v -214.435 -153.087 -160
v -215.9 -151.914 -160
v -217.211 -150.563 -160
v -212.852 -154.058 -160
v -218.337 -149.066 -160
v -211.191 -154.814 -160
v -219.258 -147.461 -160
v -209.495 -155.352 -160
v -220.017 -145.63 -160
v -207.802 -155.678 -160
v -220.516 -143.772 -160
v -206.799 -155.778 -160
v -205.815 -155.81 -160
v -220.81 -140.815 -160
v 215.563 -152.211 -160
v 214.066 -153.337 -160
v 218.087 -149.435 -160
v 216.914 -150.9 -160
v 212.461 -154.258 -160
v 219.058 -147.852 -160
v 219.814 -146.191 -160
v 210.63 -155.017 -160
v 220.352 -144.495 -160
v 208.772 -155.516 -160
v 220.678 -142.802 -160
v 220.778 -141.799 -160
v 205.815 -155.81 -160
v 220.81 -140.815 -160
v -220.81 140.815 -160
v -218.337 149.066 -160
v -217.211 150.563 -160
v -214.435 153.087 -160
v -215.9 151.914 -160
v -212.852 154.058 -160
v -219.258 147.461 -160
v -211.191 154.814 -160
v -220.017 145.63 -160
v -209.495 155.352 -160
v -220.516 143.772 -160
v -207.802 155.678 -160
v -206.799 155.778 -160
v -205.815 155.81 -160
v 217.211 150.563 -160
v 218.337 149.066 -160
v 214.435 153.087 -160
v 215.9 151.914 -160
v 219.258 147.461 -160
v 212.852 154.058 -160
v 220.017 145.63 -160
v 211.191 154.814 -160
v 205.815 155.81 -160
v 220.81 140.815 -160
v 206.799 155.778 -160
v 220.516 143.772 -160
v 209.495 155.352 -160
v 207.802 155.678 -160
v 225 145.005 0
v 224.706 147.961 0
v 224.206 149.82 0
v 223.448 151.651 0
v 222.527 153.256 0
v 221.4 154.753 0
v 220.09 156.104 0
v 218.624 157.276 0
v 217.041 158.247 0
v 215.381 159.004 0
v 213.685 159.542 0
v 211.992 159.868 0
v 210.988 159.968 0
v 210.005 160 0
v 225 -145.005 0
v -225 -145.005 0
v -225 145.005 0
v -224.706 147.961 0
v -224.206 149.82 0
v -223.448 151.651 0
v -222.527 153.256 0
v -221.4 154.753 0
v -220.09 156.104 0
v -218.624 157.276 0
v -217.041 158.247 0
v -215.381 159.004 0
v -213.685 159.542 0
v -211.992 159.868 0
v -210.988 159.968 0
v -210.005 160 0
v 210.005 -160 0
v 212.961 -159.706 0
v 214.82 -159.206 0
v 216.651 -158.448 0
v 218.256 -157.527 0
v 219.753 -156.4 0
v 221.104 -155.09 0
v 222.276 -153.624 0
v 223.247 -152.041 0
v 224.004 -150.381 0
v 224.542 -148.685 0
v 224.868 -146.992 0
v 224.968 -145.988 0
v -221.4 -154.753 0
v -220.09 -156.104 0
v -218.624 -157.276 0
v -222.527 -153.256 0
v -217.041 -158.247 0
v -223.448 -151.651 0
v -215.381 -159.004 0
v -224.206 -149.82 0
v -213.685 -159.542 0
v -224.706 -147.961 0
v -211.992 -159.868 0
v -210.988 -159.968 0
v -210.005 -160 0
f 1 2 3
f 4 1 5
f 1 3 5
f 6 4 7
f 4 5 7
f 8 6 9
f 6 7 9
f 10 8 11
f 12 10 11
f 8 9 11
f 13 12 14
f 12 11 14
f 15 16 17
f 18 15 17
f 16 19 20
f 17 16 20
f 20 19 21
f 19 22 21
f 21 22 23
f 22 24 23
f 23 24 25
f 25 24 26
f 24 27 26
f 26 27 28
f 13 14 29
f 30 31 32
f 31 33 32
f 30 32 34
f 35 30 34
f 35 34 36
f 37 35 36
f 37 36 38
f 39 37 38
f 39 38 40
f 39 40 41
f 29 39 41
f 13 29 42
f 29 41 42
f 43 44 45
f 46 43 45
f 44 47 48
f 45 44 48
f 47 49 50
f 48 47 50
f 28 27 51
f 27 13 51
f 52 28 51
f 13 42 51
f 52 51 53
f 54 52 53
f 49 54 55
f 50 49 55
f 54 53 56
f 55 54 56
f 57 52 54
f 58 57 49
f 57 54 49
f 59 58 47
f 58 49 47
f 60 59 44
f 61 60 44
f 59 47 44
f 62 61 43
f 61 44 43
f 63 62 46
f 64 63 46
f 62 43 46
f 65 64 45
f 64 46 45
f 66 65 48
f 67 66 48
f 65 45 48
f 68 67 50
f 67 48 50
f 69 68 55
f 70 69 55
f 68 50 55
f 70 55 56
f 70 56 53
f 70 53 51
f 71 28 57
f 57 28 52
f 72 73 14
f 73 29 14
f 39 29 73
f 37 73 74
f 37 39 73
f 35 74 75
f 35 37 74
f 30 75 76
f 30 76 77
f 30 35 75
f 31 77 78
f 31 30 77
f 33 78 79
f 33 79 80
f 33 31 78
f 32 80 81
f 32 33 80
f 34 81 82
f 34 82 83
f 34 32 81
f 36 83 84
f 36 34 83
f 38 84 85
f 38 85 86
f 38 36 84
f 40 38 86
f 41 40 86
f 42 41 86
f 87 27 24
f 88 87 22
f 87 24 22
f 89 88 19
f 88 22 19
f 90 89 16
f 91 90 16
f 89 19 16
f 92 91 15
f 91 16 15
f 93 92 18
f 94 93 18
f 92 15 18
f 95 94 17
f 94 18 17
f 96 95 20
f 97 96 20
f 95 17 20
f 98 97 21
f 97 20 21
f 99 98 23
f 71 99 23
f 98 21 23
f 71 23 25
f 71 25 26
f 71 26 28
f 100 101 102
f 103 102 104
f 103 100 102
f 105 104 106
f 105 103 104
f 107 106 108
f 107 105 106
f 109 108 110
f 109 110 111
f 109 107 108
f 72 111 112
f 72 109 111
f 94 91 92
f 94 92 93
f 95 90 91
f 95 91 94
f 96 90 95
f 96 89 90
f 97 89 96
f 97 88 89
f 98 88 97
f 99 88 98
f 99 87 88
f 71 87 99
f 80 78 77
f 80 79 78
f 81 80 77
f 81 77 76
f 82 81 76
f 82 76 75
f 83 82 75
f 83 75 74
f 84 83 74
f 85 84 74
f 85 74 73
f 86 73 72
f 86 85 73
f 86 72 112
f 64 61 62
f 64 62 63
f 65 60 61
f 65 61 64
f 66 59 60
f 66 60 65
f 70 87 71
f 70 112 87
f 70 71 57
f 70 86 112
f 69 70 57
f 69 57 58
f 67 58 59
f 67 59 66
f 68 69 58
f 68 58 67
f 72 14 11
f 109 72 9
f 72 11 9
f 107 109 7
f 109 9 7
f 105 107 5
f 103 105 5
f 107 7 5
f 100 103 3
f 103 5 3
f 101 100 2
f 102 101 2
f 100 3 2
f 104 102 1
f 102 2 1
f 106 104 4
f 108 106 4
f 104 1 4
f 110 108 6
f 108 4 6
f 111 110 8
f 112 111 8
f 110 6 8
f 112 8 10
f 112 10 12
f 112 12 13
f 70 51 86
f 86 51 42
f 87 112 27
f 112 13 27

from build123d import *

# Parameters (mm, degrees)
F0_W     = 450
F0_H     = 320
F1_DEPTH = 160
F1_TAPER = 1.5
F2_R     = 15


with BuildPart() as f1:
    # F0 (on Top) → F1 (new body)
    with BuildSketch(Plane.XY):
        Rectangle(F0_W, F0_H)
    extrude(amount=-F1_DEPTH, taper=F1_TAPER)

    # F2
    f2_edges = [f1.edges().sort_by_distance(p)[0] for p in [
        (-222.905126, 157.905126, -80),
        (-222.905126, -157.905126, -80),
        (222.905126, -157.905126, -80),
        (222.905126, 157.905126, -80),
    ]]
    fillet(f2_edges, radius=F2_R)


solid = f1.part
